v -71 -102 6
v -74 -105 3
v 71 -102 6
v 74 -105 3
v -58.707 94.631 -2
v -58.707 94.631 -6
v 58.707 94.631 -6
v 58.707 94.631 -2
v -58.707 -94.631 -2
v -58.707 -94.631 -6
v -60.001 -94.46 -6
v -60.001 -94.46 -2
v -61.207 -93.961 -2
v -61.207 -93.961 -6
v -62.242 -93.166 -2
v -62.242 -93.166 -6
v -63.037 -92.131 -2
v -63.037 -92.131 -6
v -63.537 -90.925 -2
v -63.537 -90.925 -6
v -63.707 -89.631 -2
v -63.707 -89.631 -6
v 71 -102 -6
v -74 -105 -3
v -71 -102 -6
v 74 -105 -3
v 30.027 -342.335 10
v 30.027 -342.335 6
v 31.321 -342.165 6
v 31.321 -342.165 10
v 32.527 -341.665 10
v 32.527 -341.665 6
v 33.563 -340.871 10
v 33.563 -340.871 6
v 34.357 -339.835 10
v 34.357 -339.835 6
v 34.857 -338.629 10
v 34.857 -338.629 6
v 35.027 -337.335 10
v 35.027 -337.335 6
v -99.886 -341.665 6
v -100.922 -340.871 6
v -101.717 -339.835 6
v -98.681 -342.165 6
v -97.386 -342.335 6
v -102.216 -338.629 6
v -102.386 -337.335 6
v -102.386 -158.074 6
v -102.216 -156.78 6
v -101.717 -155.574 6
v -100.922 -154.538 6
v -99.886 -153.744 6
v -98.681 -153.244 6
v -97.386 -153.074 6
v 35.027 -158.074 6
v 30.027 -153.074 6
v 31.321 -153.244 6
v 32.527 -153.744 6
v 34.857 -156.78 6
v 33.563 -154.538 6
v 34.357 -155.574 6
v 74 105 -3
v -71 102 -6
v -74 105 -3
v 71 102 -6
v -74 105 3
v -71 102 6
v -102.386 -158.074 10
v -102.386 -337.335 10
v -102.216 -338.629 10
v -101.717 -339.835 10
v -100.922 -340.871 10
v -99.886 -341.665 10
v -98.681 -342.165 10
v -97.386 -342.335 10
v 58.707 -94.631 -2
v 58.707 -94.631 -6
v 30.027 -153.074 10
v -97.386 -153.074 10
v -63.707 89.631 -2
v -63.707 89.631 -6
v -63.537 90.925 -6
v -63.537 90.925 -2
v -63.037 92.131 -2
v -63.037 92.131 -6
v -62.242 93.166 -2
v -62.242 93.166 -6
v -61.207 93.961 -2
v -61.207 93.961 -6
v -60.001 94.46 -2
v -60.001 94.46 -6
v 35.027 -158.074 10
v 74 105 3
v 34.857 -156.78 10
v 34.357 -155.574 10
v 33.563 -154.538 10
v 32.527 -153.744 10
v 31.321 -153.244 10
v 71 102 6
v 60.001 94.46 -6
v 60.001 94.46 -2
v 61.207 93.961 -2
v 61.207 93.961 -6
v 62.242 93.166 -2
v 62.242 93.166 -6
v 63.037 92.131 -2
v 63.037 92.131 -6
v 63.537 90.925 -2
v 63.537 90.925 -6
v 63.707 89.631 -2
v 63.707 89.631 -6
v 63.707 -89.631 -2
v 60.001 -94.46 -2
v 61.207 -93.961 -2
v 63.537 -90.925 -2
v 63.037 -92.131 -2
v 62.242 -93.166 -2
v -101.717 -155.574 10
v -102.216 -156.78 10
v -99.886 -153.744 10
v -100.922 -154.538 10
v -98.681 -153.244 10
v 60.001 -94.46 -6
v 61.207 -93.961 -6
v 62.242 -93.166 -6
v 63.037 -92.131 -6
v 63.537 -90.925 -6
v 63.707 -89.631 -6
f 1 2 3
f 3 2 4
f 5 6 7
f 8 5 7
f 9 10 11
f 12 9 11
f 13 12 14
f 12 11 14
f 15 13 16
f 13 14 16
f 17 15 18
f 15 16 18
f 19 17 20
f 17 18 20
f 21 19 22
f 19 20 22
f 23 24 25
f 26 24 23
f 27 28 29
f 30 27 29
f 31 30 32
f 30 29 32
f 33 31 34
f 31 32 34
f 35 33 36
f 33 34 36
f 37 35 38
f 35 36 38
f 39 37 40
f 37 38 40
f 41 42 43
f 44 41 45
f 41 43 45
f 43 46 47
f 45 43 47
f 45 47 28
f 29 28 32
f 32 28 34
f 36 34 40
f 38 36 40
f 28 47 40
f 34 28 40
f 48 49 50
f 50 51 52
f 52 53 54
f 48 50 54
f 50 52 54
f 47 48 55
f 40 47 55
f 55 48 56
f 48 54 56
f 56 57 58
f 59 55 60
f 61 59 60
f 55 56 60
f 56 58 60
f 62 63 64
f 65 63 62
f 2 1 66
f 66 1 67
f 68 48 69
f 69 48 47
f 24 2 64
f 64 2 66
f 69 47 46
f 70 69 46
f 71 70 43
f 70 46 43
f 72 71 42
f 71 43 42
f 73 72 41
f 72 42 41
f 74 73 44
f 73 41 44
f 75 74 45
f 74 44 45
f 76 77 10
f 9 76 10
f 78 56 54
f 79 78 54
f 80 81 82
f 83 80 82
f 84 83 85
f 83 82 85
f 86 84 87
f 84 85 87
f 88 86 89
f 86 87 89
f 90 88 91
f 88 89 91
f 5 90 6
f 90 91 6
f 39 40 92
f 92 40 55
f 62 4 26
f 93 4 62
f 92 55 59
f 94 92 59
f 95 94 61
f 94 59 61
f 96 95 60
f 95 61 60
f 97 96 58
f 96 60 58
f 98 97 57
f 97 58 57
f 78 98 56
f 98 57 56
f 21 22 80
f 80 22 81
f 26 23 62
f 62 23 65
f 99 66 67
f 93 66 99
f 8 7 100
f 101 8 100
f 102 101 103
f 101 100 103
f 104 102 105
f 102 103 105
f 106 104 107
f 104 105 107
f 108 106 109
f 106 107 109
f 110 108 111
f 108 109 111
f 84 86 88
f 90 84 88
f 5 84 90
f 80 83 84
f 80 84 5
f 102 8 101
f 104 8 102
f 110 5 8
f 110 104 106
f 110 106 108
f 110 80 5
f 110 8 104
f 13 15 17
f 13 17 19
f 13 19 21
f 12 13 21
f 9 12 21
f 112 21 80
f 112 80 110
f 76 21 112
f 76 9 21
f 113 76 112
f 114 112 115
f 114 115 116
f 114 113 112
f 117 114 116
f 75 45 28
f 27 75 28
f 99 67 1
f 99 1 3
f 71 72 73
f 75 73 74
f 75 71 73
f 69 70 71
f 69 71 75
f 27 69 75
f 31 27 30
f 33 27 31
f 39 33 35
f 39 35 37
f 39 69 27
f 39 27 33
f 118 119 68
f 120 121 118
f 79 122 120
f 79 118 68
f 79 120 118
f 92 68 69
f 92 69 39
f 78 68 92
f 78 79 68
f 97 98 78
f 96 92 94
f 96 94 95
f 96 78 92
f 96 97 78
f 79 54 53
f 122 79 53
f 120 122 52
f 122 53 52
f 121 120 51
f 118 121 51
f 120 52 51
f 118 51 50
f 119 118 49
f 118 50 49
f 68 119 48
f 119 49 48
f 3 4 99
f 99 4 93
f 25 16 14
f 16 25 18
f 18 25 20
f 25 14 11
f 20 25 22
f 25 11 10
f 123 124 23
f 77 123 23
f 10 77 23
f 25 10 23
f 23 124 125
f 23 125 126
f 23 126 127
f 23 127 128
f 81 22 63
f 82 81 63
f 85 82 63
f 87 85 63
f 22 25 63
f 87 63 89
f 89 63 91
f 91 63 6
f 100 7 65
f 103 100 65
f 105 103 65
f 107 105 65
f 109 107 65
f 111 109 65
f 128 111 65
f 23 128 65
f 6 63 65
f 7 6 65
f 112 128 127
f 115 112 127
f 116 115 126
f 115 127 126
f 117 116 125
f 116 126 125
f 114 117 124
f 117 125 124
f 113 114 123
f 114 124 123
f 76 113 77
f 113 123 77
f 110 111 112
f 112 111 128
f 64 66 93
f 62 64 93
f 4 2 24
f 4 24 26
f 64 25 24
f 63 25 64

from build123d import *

# Parameters (mm, degrees)
F0_W     = 148
F0_H     = 210
F1_DEPTH = 6
F2_SIZE  = 3
F4_DEPTH = 4
F6_DEPTH = 4


with BuildPart() as f1:
    # F0 (on Top) → F1 (new body, symmetric)
    with BuildSketch(Plane.XY):
        Rectangle(F0_W, F0_H)
    extrude(amount=F1_DEPTH, both=True)

    # F2
    f2_edges = [f1.edges().sort_by_distance(p)[0] for p in [
        (74, 0, 6),
        (74, 0, -6),
        (0, -105, -6),
        (0, -105, 6),
        (-74, 0, 6),
        (-74, 0, -6),
        (0, 105, -6),
        (0, 105, 6),
    ]]
    chamfer(f2_edges, length=F2_SIZE)

    # F3 (on face) → F4 (cut)
    with BuildSketch(Plane(origin=(0, 0, -6), x_dir=(1, 0, 0), z_dir=(0, 0, -1))):
        with BuildLine():
            Line((58.706875, 94.630778), (-58.706875, 94.630778))
            ThreePointArc((-58.706875, 94.630778), (-62.242409, 93.166312), (-63.706875, 89.630778))
            Line((-63.706875, 89.630778), (-63.706875, -89.630778))
            ThreePointArc((-63.706875, -89.630778), (-62.242409, -93.166312), (-58.706875, -94.630778))
            Line((-58.706875, -94.630778), (58.706875, -94.630778))
            ThreePointArc((58.706875, -94.630778), (62.242409, -93.166312), (63.706875, -89.630778))
            Line((63.706875, -89.630778), (63.706875, 89.630778))
            ThreePointArc((63.706875, 89.630778), (62.242409, 93.166312), (58.706875, 94.630778))
        make_face()
    extrude(amount=-F4_DEPTH, mode=Mode.SUBTRACT)


with BuildPart() as f6:
    # F5 (on face) → F6 (new body)
    with BuildSketch(Plane.XY.offset(6)):
        with BuildLine():
            Line((30.027316, -153.073728), (-97.386434, -153.073728))
            ThreePointArc((-97.386434, -153.073728), (-100.921968, -154.538194), (-102.386434, -158.073728))
            Line((-102.386434, -158.073728), (-102.386434, -337.335284))
            ThreePointArc((-102.386434, -337.335284), (-100.921968, -340.870818), (-97.386434, -342.335284))
            Line((-97.386434, -342.335284), (30.027316, -342.335284))
            ThreePointArc((30.027316, -342.335284), (33.56285, -340.870818), (35.027316, -337.335284))
            Line((35.027316, -337.335284), (35.027316, -158.073728))
            ThreePointArc((35.027316, -158.073728), (33.56285, -154.538194), (30.027316, -153.073728))
        make_face()
    extrude(amount=F6_DEPTH)


solid = Compound([f1.part, f6.part])
